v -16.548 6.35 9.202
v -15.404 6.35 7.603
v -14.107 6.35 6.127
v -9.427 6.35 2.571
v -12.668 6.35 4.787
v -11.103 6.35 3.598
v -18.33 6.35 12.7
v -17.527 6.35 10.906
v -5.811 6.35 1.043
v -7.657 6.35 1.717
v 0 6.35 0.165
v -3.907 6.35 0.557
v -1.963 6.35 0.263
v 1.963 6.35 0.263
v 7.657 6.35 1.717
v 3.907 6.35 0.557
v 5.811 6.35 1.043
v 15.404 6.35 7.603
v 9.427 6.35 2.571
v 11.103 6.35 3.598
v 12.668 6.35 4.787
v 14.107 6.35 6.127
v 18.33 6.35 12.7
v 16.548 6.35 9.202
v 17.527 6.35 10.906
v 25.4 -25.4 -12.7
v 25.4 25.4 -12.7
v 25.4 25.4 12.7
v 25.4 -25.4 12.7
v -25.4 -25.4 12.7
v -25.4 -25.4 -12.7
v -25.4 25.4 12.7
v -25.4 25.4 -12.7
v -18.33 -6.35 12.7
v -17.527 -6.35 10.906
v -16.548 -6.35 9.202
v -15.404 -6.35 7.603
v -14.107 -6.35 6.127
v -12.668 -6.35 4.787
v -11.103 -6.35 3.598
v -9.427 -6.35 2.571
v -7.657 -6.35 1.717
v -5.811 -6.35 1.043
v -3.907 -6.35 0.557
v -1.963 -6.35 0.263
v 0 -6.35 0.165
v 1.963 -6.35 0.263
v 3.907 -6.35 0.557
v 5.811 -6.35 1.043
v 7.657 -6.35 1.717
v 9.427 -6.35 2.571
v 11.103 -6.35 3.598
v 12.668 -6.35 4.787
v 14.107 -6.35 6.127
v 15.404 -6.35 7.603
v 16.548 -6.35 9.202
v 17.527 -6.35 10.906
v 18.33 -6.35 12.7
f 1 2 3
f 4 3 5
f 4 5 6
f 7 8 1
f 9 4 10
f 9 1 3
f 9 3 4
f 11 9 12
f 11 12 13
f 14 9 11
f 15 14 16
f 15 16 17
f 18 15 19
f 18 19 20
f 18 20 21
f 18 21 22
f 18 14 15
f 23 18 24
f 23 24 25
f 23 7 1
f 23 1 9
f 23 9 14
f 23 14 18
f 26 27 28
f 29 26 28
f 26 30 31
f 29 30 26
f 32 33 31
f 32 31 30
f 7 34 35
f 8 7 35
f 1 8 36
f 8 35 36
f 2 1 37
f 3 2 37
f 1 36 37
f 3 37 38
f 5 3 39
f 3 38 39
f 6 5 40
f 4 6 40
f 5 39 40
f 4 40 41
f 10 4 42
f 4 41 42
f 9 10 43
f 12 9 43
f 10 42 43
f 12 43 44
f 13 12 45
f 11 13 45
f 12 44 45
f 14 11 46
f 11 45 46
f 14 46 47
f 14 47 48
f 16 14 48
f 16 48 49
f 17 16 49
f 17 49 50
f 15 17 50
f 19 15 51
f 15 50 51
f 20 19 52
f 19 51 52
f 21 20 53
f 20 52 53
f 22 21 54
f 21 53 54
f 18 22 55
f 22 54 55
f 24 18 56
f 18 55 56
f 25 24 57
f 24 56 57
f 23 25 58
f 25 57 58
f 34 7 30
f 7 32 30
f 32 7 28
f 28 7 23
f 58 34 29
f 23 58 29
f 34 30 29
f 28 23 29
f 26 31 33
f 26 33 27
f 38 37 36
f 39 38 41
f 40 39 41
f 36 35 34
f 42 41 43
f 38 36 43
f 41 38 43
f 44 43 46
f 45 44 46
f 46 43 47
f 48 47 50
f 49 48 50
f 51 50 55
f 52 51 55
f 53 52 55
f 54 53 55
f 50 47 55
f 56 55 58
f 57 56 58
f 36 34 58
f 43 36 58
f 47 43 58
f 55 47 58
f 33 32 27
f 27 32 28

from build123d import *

# Parameters (mm, degrees)
F0_W     = 50.8
F0_H     = 25.4
F2_DEPTH = 25.4
F3_DEPTH = 6.35


with BuildPart() as f2:
    # F0 (on Front) → F2 (new body, symmetric)
    with BuildSketch(Plane.XZ):
        Rectangle(F0_W, F0_H)
    extrude(amount=F2_DEPTH, both=True)

    # F1 (on Front) → F3 (cut, symmetric)
    with BuildSketch(Plane.XZ):
        with BuildLine():
            Line((18.556945, 13.312588), (-18.556941, 13.312588))
            ThreePointArc((-18.556941, 13.312588), (2e-06, 0.164781), (18.556945, 13.312588))
        make_face()
    extrude(amount=F3_DEPTH, both=True, mode=Mode.SUBTRACT)


solid = f2.part
